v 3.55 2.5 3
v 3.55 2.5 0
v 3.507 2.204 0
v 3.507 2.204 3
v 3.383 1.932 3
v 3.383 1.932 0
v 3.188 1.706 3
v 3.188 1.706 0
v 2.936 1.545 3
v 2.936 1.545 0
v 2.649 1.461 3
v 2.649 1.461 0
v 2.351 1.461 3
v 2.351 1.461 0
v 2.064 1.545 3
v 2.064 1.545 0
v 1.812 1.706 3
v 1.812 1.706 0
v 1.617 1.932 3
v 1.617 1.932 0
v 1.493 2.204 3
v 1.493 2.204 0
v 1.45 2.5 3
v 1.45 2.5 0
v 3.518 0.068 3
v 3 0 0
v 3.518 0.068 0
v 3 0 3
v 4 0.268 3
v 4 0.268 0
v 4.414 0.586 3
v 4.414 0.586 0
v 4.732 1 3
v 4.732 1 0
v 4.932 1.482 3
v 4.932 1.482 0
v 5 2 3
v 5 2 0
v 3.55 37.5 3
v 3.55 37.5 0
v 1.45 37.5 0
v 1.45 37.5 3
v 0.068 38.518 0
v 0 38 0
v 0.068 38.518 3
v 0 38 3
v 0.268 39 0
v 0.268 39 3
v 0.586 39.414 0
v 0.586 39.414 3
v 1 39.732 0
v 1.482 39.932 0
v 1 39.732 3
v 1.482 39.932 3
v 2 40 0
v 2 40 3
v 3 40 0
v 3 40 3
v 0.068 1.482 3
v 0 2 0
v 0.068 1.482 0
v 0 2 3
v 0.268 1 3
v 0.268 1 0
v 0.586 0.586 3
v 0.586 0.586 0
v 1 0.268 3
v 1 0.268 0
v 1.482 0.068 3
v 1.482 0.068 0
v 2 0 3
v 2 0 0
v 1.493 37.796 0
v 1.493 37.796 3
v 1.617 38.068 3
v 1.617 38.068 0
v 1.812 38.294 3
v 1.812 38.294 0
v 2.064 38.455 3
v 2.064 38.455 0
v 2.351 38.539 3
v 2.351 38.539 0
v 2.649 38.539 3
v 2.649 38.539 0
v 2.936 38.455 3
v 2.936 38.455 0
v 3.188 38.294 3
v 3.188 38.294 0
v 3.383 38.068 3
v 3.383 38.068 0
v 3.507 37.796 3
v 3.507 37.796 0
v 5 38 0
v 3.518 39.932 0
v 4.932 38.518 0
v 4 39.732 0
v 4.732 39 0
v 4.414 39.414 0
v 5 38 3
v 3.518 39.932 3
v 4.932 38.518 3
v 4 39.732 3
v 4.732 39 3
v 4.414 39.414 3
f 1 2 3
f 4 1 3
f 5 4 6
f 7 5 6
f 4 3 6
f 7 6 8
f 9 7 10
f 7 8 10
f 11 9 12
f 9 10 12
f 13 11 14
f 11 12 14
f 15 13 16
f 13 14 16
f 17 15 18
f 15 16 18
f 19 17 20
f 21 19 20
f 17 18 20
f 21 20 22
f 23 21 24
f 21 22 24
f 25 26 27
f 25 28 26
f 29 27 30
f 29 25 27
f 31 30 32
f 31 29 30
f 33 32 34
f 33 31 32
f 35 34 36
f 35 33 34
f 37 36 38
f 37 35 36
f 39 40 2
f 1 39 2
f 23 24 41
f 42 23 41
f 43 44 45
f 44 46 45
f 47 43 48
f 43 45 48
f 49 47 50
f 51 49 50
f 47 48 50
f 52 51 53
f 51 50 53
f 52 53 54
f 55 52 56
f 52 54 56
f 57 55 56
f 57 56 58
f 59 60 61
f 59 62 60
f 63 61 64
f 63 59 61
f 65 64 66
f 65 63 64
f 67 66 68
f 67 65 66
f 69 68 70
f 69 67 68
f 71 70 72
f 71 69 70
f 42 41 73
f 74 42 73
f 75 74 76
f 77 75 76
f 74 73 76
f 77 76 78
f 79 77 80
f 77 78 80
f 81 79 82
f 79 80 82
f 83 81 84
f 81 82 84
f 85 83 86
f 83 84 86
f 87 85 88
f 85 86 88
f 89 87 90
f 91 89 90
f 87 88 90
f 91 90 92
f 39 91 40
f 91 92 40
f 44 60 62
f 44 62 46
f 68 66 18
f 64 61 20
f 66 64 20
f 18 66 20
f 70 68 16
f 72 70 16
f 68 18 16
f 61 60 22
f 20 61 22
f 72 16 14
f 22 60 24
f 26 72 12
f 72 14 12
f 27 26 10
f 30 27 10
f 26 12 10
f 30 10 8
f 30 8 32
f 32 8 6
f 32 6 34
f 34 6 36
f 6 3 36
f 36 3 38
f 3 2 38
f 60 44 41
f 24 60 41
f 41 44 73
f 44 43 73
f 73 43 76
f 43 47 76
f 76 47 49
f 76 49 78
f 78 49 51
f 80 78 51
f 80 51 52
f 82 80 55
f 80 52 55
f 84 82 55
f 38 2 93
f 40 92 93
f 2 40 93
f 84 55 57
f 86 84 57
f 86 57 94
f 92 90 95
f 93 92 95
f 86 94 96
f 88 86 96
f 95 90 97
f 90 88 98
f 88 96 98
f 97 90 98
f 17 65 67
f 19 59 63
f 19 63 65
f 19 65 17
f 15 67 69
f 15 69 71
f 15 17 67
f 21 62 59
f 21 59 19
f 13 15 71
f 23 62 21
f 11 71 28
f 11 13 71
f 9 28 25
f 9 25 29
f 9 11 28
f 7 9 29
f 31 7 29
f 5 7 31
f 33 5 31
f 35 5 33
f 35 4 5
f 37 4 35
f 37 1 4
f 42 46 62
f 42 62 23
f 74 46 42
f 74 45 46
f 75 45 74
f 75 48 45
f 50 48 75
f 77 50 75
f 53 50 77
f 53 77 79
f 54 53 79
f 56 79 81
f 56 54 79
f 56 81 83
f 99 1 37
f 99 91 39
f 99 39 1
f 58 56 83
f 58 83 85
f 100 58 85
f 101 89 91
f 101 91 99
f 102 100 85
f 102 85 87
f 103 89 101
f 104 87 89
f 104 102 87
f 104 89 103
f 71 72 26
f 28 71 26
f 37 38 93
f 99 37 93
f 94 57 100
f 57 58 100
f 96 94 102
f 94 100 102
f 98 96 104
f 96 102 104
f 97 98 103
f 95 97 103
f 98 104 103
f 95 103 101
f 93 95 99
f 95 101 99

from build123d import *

# Parameters (mm, degrees)
SKETCH1_W           = 5
SKETCH1_H           = 40
BOSS_EXTRUDE1_DEPTH = 3
FILLET1_R           = 2


with BuildPart() as part:
    # Sketch1 → Boss-Extrude1 (new body)
    with BuildSketch(Plane.XY):
        with Locations((2.5, 20)):
            Rectangle(SKETCH1_W, SKETCH1_H)
        with BuildLine():
            Line((3.55, 37.5), (3.55, 2.5))
            ThreePointArc((3.55, 2.5), (2.5, 1.45), (1.45, 2.5))
            Line((1.45, 2.5), (1.45, 37.5))
            ThreePointArc((1.45, 37.5), (2.5, 38.55), (3.55, 37.5))
        make_face(mode=Mode.SUBTRACT)
    extrude(amount=BOSS_EXTRUDE1_DEPTH)

    # Fillet1
    fillet1_edges = [part.edges().sort_by_distance(p)[0] for p in [
        (0, 40, 1.5),
        (5, 40, 1.5),
        (5, 0, 1.5),
        (0, 0, 1.5),
    ]]
    fillet(fillet1_edges, radius=FILLET1_R)


solid = part.part
